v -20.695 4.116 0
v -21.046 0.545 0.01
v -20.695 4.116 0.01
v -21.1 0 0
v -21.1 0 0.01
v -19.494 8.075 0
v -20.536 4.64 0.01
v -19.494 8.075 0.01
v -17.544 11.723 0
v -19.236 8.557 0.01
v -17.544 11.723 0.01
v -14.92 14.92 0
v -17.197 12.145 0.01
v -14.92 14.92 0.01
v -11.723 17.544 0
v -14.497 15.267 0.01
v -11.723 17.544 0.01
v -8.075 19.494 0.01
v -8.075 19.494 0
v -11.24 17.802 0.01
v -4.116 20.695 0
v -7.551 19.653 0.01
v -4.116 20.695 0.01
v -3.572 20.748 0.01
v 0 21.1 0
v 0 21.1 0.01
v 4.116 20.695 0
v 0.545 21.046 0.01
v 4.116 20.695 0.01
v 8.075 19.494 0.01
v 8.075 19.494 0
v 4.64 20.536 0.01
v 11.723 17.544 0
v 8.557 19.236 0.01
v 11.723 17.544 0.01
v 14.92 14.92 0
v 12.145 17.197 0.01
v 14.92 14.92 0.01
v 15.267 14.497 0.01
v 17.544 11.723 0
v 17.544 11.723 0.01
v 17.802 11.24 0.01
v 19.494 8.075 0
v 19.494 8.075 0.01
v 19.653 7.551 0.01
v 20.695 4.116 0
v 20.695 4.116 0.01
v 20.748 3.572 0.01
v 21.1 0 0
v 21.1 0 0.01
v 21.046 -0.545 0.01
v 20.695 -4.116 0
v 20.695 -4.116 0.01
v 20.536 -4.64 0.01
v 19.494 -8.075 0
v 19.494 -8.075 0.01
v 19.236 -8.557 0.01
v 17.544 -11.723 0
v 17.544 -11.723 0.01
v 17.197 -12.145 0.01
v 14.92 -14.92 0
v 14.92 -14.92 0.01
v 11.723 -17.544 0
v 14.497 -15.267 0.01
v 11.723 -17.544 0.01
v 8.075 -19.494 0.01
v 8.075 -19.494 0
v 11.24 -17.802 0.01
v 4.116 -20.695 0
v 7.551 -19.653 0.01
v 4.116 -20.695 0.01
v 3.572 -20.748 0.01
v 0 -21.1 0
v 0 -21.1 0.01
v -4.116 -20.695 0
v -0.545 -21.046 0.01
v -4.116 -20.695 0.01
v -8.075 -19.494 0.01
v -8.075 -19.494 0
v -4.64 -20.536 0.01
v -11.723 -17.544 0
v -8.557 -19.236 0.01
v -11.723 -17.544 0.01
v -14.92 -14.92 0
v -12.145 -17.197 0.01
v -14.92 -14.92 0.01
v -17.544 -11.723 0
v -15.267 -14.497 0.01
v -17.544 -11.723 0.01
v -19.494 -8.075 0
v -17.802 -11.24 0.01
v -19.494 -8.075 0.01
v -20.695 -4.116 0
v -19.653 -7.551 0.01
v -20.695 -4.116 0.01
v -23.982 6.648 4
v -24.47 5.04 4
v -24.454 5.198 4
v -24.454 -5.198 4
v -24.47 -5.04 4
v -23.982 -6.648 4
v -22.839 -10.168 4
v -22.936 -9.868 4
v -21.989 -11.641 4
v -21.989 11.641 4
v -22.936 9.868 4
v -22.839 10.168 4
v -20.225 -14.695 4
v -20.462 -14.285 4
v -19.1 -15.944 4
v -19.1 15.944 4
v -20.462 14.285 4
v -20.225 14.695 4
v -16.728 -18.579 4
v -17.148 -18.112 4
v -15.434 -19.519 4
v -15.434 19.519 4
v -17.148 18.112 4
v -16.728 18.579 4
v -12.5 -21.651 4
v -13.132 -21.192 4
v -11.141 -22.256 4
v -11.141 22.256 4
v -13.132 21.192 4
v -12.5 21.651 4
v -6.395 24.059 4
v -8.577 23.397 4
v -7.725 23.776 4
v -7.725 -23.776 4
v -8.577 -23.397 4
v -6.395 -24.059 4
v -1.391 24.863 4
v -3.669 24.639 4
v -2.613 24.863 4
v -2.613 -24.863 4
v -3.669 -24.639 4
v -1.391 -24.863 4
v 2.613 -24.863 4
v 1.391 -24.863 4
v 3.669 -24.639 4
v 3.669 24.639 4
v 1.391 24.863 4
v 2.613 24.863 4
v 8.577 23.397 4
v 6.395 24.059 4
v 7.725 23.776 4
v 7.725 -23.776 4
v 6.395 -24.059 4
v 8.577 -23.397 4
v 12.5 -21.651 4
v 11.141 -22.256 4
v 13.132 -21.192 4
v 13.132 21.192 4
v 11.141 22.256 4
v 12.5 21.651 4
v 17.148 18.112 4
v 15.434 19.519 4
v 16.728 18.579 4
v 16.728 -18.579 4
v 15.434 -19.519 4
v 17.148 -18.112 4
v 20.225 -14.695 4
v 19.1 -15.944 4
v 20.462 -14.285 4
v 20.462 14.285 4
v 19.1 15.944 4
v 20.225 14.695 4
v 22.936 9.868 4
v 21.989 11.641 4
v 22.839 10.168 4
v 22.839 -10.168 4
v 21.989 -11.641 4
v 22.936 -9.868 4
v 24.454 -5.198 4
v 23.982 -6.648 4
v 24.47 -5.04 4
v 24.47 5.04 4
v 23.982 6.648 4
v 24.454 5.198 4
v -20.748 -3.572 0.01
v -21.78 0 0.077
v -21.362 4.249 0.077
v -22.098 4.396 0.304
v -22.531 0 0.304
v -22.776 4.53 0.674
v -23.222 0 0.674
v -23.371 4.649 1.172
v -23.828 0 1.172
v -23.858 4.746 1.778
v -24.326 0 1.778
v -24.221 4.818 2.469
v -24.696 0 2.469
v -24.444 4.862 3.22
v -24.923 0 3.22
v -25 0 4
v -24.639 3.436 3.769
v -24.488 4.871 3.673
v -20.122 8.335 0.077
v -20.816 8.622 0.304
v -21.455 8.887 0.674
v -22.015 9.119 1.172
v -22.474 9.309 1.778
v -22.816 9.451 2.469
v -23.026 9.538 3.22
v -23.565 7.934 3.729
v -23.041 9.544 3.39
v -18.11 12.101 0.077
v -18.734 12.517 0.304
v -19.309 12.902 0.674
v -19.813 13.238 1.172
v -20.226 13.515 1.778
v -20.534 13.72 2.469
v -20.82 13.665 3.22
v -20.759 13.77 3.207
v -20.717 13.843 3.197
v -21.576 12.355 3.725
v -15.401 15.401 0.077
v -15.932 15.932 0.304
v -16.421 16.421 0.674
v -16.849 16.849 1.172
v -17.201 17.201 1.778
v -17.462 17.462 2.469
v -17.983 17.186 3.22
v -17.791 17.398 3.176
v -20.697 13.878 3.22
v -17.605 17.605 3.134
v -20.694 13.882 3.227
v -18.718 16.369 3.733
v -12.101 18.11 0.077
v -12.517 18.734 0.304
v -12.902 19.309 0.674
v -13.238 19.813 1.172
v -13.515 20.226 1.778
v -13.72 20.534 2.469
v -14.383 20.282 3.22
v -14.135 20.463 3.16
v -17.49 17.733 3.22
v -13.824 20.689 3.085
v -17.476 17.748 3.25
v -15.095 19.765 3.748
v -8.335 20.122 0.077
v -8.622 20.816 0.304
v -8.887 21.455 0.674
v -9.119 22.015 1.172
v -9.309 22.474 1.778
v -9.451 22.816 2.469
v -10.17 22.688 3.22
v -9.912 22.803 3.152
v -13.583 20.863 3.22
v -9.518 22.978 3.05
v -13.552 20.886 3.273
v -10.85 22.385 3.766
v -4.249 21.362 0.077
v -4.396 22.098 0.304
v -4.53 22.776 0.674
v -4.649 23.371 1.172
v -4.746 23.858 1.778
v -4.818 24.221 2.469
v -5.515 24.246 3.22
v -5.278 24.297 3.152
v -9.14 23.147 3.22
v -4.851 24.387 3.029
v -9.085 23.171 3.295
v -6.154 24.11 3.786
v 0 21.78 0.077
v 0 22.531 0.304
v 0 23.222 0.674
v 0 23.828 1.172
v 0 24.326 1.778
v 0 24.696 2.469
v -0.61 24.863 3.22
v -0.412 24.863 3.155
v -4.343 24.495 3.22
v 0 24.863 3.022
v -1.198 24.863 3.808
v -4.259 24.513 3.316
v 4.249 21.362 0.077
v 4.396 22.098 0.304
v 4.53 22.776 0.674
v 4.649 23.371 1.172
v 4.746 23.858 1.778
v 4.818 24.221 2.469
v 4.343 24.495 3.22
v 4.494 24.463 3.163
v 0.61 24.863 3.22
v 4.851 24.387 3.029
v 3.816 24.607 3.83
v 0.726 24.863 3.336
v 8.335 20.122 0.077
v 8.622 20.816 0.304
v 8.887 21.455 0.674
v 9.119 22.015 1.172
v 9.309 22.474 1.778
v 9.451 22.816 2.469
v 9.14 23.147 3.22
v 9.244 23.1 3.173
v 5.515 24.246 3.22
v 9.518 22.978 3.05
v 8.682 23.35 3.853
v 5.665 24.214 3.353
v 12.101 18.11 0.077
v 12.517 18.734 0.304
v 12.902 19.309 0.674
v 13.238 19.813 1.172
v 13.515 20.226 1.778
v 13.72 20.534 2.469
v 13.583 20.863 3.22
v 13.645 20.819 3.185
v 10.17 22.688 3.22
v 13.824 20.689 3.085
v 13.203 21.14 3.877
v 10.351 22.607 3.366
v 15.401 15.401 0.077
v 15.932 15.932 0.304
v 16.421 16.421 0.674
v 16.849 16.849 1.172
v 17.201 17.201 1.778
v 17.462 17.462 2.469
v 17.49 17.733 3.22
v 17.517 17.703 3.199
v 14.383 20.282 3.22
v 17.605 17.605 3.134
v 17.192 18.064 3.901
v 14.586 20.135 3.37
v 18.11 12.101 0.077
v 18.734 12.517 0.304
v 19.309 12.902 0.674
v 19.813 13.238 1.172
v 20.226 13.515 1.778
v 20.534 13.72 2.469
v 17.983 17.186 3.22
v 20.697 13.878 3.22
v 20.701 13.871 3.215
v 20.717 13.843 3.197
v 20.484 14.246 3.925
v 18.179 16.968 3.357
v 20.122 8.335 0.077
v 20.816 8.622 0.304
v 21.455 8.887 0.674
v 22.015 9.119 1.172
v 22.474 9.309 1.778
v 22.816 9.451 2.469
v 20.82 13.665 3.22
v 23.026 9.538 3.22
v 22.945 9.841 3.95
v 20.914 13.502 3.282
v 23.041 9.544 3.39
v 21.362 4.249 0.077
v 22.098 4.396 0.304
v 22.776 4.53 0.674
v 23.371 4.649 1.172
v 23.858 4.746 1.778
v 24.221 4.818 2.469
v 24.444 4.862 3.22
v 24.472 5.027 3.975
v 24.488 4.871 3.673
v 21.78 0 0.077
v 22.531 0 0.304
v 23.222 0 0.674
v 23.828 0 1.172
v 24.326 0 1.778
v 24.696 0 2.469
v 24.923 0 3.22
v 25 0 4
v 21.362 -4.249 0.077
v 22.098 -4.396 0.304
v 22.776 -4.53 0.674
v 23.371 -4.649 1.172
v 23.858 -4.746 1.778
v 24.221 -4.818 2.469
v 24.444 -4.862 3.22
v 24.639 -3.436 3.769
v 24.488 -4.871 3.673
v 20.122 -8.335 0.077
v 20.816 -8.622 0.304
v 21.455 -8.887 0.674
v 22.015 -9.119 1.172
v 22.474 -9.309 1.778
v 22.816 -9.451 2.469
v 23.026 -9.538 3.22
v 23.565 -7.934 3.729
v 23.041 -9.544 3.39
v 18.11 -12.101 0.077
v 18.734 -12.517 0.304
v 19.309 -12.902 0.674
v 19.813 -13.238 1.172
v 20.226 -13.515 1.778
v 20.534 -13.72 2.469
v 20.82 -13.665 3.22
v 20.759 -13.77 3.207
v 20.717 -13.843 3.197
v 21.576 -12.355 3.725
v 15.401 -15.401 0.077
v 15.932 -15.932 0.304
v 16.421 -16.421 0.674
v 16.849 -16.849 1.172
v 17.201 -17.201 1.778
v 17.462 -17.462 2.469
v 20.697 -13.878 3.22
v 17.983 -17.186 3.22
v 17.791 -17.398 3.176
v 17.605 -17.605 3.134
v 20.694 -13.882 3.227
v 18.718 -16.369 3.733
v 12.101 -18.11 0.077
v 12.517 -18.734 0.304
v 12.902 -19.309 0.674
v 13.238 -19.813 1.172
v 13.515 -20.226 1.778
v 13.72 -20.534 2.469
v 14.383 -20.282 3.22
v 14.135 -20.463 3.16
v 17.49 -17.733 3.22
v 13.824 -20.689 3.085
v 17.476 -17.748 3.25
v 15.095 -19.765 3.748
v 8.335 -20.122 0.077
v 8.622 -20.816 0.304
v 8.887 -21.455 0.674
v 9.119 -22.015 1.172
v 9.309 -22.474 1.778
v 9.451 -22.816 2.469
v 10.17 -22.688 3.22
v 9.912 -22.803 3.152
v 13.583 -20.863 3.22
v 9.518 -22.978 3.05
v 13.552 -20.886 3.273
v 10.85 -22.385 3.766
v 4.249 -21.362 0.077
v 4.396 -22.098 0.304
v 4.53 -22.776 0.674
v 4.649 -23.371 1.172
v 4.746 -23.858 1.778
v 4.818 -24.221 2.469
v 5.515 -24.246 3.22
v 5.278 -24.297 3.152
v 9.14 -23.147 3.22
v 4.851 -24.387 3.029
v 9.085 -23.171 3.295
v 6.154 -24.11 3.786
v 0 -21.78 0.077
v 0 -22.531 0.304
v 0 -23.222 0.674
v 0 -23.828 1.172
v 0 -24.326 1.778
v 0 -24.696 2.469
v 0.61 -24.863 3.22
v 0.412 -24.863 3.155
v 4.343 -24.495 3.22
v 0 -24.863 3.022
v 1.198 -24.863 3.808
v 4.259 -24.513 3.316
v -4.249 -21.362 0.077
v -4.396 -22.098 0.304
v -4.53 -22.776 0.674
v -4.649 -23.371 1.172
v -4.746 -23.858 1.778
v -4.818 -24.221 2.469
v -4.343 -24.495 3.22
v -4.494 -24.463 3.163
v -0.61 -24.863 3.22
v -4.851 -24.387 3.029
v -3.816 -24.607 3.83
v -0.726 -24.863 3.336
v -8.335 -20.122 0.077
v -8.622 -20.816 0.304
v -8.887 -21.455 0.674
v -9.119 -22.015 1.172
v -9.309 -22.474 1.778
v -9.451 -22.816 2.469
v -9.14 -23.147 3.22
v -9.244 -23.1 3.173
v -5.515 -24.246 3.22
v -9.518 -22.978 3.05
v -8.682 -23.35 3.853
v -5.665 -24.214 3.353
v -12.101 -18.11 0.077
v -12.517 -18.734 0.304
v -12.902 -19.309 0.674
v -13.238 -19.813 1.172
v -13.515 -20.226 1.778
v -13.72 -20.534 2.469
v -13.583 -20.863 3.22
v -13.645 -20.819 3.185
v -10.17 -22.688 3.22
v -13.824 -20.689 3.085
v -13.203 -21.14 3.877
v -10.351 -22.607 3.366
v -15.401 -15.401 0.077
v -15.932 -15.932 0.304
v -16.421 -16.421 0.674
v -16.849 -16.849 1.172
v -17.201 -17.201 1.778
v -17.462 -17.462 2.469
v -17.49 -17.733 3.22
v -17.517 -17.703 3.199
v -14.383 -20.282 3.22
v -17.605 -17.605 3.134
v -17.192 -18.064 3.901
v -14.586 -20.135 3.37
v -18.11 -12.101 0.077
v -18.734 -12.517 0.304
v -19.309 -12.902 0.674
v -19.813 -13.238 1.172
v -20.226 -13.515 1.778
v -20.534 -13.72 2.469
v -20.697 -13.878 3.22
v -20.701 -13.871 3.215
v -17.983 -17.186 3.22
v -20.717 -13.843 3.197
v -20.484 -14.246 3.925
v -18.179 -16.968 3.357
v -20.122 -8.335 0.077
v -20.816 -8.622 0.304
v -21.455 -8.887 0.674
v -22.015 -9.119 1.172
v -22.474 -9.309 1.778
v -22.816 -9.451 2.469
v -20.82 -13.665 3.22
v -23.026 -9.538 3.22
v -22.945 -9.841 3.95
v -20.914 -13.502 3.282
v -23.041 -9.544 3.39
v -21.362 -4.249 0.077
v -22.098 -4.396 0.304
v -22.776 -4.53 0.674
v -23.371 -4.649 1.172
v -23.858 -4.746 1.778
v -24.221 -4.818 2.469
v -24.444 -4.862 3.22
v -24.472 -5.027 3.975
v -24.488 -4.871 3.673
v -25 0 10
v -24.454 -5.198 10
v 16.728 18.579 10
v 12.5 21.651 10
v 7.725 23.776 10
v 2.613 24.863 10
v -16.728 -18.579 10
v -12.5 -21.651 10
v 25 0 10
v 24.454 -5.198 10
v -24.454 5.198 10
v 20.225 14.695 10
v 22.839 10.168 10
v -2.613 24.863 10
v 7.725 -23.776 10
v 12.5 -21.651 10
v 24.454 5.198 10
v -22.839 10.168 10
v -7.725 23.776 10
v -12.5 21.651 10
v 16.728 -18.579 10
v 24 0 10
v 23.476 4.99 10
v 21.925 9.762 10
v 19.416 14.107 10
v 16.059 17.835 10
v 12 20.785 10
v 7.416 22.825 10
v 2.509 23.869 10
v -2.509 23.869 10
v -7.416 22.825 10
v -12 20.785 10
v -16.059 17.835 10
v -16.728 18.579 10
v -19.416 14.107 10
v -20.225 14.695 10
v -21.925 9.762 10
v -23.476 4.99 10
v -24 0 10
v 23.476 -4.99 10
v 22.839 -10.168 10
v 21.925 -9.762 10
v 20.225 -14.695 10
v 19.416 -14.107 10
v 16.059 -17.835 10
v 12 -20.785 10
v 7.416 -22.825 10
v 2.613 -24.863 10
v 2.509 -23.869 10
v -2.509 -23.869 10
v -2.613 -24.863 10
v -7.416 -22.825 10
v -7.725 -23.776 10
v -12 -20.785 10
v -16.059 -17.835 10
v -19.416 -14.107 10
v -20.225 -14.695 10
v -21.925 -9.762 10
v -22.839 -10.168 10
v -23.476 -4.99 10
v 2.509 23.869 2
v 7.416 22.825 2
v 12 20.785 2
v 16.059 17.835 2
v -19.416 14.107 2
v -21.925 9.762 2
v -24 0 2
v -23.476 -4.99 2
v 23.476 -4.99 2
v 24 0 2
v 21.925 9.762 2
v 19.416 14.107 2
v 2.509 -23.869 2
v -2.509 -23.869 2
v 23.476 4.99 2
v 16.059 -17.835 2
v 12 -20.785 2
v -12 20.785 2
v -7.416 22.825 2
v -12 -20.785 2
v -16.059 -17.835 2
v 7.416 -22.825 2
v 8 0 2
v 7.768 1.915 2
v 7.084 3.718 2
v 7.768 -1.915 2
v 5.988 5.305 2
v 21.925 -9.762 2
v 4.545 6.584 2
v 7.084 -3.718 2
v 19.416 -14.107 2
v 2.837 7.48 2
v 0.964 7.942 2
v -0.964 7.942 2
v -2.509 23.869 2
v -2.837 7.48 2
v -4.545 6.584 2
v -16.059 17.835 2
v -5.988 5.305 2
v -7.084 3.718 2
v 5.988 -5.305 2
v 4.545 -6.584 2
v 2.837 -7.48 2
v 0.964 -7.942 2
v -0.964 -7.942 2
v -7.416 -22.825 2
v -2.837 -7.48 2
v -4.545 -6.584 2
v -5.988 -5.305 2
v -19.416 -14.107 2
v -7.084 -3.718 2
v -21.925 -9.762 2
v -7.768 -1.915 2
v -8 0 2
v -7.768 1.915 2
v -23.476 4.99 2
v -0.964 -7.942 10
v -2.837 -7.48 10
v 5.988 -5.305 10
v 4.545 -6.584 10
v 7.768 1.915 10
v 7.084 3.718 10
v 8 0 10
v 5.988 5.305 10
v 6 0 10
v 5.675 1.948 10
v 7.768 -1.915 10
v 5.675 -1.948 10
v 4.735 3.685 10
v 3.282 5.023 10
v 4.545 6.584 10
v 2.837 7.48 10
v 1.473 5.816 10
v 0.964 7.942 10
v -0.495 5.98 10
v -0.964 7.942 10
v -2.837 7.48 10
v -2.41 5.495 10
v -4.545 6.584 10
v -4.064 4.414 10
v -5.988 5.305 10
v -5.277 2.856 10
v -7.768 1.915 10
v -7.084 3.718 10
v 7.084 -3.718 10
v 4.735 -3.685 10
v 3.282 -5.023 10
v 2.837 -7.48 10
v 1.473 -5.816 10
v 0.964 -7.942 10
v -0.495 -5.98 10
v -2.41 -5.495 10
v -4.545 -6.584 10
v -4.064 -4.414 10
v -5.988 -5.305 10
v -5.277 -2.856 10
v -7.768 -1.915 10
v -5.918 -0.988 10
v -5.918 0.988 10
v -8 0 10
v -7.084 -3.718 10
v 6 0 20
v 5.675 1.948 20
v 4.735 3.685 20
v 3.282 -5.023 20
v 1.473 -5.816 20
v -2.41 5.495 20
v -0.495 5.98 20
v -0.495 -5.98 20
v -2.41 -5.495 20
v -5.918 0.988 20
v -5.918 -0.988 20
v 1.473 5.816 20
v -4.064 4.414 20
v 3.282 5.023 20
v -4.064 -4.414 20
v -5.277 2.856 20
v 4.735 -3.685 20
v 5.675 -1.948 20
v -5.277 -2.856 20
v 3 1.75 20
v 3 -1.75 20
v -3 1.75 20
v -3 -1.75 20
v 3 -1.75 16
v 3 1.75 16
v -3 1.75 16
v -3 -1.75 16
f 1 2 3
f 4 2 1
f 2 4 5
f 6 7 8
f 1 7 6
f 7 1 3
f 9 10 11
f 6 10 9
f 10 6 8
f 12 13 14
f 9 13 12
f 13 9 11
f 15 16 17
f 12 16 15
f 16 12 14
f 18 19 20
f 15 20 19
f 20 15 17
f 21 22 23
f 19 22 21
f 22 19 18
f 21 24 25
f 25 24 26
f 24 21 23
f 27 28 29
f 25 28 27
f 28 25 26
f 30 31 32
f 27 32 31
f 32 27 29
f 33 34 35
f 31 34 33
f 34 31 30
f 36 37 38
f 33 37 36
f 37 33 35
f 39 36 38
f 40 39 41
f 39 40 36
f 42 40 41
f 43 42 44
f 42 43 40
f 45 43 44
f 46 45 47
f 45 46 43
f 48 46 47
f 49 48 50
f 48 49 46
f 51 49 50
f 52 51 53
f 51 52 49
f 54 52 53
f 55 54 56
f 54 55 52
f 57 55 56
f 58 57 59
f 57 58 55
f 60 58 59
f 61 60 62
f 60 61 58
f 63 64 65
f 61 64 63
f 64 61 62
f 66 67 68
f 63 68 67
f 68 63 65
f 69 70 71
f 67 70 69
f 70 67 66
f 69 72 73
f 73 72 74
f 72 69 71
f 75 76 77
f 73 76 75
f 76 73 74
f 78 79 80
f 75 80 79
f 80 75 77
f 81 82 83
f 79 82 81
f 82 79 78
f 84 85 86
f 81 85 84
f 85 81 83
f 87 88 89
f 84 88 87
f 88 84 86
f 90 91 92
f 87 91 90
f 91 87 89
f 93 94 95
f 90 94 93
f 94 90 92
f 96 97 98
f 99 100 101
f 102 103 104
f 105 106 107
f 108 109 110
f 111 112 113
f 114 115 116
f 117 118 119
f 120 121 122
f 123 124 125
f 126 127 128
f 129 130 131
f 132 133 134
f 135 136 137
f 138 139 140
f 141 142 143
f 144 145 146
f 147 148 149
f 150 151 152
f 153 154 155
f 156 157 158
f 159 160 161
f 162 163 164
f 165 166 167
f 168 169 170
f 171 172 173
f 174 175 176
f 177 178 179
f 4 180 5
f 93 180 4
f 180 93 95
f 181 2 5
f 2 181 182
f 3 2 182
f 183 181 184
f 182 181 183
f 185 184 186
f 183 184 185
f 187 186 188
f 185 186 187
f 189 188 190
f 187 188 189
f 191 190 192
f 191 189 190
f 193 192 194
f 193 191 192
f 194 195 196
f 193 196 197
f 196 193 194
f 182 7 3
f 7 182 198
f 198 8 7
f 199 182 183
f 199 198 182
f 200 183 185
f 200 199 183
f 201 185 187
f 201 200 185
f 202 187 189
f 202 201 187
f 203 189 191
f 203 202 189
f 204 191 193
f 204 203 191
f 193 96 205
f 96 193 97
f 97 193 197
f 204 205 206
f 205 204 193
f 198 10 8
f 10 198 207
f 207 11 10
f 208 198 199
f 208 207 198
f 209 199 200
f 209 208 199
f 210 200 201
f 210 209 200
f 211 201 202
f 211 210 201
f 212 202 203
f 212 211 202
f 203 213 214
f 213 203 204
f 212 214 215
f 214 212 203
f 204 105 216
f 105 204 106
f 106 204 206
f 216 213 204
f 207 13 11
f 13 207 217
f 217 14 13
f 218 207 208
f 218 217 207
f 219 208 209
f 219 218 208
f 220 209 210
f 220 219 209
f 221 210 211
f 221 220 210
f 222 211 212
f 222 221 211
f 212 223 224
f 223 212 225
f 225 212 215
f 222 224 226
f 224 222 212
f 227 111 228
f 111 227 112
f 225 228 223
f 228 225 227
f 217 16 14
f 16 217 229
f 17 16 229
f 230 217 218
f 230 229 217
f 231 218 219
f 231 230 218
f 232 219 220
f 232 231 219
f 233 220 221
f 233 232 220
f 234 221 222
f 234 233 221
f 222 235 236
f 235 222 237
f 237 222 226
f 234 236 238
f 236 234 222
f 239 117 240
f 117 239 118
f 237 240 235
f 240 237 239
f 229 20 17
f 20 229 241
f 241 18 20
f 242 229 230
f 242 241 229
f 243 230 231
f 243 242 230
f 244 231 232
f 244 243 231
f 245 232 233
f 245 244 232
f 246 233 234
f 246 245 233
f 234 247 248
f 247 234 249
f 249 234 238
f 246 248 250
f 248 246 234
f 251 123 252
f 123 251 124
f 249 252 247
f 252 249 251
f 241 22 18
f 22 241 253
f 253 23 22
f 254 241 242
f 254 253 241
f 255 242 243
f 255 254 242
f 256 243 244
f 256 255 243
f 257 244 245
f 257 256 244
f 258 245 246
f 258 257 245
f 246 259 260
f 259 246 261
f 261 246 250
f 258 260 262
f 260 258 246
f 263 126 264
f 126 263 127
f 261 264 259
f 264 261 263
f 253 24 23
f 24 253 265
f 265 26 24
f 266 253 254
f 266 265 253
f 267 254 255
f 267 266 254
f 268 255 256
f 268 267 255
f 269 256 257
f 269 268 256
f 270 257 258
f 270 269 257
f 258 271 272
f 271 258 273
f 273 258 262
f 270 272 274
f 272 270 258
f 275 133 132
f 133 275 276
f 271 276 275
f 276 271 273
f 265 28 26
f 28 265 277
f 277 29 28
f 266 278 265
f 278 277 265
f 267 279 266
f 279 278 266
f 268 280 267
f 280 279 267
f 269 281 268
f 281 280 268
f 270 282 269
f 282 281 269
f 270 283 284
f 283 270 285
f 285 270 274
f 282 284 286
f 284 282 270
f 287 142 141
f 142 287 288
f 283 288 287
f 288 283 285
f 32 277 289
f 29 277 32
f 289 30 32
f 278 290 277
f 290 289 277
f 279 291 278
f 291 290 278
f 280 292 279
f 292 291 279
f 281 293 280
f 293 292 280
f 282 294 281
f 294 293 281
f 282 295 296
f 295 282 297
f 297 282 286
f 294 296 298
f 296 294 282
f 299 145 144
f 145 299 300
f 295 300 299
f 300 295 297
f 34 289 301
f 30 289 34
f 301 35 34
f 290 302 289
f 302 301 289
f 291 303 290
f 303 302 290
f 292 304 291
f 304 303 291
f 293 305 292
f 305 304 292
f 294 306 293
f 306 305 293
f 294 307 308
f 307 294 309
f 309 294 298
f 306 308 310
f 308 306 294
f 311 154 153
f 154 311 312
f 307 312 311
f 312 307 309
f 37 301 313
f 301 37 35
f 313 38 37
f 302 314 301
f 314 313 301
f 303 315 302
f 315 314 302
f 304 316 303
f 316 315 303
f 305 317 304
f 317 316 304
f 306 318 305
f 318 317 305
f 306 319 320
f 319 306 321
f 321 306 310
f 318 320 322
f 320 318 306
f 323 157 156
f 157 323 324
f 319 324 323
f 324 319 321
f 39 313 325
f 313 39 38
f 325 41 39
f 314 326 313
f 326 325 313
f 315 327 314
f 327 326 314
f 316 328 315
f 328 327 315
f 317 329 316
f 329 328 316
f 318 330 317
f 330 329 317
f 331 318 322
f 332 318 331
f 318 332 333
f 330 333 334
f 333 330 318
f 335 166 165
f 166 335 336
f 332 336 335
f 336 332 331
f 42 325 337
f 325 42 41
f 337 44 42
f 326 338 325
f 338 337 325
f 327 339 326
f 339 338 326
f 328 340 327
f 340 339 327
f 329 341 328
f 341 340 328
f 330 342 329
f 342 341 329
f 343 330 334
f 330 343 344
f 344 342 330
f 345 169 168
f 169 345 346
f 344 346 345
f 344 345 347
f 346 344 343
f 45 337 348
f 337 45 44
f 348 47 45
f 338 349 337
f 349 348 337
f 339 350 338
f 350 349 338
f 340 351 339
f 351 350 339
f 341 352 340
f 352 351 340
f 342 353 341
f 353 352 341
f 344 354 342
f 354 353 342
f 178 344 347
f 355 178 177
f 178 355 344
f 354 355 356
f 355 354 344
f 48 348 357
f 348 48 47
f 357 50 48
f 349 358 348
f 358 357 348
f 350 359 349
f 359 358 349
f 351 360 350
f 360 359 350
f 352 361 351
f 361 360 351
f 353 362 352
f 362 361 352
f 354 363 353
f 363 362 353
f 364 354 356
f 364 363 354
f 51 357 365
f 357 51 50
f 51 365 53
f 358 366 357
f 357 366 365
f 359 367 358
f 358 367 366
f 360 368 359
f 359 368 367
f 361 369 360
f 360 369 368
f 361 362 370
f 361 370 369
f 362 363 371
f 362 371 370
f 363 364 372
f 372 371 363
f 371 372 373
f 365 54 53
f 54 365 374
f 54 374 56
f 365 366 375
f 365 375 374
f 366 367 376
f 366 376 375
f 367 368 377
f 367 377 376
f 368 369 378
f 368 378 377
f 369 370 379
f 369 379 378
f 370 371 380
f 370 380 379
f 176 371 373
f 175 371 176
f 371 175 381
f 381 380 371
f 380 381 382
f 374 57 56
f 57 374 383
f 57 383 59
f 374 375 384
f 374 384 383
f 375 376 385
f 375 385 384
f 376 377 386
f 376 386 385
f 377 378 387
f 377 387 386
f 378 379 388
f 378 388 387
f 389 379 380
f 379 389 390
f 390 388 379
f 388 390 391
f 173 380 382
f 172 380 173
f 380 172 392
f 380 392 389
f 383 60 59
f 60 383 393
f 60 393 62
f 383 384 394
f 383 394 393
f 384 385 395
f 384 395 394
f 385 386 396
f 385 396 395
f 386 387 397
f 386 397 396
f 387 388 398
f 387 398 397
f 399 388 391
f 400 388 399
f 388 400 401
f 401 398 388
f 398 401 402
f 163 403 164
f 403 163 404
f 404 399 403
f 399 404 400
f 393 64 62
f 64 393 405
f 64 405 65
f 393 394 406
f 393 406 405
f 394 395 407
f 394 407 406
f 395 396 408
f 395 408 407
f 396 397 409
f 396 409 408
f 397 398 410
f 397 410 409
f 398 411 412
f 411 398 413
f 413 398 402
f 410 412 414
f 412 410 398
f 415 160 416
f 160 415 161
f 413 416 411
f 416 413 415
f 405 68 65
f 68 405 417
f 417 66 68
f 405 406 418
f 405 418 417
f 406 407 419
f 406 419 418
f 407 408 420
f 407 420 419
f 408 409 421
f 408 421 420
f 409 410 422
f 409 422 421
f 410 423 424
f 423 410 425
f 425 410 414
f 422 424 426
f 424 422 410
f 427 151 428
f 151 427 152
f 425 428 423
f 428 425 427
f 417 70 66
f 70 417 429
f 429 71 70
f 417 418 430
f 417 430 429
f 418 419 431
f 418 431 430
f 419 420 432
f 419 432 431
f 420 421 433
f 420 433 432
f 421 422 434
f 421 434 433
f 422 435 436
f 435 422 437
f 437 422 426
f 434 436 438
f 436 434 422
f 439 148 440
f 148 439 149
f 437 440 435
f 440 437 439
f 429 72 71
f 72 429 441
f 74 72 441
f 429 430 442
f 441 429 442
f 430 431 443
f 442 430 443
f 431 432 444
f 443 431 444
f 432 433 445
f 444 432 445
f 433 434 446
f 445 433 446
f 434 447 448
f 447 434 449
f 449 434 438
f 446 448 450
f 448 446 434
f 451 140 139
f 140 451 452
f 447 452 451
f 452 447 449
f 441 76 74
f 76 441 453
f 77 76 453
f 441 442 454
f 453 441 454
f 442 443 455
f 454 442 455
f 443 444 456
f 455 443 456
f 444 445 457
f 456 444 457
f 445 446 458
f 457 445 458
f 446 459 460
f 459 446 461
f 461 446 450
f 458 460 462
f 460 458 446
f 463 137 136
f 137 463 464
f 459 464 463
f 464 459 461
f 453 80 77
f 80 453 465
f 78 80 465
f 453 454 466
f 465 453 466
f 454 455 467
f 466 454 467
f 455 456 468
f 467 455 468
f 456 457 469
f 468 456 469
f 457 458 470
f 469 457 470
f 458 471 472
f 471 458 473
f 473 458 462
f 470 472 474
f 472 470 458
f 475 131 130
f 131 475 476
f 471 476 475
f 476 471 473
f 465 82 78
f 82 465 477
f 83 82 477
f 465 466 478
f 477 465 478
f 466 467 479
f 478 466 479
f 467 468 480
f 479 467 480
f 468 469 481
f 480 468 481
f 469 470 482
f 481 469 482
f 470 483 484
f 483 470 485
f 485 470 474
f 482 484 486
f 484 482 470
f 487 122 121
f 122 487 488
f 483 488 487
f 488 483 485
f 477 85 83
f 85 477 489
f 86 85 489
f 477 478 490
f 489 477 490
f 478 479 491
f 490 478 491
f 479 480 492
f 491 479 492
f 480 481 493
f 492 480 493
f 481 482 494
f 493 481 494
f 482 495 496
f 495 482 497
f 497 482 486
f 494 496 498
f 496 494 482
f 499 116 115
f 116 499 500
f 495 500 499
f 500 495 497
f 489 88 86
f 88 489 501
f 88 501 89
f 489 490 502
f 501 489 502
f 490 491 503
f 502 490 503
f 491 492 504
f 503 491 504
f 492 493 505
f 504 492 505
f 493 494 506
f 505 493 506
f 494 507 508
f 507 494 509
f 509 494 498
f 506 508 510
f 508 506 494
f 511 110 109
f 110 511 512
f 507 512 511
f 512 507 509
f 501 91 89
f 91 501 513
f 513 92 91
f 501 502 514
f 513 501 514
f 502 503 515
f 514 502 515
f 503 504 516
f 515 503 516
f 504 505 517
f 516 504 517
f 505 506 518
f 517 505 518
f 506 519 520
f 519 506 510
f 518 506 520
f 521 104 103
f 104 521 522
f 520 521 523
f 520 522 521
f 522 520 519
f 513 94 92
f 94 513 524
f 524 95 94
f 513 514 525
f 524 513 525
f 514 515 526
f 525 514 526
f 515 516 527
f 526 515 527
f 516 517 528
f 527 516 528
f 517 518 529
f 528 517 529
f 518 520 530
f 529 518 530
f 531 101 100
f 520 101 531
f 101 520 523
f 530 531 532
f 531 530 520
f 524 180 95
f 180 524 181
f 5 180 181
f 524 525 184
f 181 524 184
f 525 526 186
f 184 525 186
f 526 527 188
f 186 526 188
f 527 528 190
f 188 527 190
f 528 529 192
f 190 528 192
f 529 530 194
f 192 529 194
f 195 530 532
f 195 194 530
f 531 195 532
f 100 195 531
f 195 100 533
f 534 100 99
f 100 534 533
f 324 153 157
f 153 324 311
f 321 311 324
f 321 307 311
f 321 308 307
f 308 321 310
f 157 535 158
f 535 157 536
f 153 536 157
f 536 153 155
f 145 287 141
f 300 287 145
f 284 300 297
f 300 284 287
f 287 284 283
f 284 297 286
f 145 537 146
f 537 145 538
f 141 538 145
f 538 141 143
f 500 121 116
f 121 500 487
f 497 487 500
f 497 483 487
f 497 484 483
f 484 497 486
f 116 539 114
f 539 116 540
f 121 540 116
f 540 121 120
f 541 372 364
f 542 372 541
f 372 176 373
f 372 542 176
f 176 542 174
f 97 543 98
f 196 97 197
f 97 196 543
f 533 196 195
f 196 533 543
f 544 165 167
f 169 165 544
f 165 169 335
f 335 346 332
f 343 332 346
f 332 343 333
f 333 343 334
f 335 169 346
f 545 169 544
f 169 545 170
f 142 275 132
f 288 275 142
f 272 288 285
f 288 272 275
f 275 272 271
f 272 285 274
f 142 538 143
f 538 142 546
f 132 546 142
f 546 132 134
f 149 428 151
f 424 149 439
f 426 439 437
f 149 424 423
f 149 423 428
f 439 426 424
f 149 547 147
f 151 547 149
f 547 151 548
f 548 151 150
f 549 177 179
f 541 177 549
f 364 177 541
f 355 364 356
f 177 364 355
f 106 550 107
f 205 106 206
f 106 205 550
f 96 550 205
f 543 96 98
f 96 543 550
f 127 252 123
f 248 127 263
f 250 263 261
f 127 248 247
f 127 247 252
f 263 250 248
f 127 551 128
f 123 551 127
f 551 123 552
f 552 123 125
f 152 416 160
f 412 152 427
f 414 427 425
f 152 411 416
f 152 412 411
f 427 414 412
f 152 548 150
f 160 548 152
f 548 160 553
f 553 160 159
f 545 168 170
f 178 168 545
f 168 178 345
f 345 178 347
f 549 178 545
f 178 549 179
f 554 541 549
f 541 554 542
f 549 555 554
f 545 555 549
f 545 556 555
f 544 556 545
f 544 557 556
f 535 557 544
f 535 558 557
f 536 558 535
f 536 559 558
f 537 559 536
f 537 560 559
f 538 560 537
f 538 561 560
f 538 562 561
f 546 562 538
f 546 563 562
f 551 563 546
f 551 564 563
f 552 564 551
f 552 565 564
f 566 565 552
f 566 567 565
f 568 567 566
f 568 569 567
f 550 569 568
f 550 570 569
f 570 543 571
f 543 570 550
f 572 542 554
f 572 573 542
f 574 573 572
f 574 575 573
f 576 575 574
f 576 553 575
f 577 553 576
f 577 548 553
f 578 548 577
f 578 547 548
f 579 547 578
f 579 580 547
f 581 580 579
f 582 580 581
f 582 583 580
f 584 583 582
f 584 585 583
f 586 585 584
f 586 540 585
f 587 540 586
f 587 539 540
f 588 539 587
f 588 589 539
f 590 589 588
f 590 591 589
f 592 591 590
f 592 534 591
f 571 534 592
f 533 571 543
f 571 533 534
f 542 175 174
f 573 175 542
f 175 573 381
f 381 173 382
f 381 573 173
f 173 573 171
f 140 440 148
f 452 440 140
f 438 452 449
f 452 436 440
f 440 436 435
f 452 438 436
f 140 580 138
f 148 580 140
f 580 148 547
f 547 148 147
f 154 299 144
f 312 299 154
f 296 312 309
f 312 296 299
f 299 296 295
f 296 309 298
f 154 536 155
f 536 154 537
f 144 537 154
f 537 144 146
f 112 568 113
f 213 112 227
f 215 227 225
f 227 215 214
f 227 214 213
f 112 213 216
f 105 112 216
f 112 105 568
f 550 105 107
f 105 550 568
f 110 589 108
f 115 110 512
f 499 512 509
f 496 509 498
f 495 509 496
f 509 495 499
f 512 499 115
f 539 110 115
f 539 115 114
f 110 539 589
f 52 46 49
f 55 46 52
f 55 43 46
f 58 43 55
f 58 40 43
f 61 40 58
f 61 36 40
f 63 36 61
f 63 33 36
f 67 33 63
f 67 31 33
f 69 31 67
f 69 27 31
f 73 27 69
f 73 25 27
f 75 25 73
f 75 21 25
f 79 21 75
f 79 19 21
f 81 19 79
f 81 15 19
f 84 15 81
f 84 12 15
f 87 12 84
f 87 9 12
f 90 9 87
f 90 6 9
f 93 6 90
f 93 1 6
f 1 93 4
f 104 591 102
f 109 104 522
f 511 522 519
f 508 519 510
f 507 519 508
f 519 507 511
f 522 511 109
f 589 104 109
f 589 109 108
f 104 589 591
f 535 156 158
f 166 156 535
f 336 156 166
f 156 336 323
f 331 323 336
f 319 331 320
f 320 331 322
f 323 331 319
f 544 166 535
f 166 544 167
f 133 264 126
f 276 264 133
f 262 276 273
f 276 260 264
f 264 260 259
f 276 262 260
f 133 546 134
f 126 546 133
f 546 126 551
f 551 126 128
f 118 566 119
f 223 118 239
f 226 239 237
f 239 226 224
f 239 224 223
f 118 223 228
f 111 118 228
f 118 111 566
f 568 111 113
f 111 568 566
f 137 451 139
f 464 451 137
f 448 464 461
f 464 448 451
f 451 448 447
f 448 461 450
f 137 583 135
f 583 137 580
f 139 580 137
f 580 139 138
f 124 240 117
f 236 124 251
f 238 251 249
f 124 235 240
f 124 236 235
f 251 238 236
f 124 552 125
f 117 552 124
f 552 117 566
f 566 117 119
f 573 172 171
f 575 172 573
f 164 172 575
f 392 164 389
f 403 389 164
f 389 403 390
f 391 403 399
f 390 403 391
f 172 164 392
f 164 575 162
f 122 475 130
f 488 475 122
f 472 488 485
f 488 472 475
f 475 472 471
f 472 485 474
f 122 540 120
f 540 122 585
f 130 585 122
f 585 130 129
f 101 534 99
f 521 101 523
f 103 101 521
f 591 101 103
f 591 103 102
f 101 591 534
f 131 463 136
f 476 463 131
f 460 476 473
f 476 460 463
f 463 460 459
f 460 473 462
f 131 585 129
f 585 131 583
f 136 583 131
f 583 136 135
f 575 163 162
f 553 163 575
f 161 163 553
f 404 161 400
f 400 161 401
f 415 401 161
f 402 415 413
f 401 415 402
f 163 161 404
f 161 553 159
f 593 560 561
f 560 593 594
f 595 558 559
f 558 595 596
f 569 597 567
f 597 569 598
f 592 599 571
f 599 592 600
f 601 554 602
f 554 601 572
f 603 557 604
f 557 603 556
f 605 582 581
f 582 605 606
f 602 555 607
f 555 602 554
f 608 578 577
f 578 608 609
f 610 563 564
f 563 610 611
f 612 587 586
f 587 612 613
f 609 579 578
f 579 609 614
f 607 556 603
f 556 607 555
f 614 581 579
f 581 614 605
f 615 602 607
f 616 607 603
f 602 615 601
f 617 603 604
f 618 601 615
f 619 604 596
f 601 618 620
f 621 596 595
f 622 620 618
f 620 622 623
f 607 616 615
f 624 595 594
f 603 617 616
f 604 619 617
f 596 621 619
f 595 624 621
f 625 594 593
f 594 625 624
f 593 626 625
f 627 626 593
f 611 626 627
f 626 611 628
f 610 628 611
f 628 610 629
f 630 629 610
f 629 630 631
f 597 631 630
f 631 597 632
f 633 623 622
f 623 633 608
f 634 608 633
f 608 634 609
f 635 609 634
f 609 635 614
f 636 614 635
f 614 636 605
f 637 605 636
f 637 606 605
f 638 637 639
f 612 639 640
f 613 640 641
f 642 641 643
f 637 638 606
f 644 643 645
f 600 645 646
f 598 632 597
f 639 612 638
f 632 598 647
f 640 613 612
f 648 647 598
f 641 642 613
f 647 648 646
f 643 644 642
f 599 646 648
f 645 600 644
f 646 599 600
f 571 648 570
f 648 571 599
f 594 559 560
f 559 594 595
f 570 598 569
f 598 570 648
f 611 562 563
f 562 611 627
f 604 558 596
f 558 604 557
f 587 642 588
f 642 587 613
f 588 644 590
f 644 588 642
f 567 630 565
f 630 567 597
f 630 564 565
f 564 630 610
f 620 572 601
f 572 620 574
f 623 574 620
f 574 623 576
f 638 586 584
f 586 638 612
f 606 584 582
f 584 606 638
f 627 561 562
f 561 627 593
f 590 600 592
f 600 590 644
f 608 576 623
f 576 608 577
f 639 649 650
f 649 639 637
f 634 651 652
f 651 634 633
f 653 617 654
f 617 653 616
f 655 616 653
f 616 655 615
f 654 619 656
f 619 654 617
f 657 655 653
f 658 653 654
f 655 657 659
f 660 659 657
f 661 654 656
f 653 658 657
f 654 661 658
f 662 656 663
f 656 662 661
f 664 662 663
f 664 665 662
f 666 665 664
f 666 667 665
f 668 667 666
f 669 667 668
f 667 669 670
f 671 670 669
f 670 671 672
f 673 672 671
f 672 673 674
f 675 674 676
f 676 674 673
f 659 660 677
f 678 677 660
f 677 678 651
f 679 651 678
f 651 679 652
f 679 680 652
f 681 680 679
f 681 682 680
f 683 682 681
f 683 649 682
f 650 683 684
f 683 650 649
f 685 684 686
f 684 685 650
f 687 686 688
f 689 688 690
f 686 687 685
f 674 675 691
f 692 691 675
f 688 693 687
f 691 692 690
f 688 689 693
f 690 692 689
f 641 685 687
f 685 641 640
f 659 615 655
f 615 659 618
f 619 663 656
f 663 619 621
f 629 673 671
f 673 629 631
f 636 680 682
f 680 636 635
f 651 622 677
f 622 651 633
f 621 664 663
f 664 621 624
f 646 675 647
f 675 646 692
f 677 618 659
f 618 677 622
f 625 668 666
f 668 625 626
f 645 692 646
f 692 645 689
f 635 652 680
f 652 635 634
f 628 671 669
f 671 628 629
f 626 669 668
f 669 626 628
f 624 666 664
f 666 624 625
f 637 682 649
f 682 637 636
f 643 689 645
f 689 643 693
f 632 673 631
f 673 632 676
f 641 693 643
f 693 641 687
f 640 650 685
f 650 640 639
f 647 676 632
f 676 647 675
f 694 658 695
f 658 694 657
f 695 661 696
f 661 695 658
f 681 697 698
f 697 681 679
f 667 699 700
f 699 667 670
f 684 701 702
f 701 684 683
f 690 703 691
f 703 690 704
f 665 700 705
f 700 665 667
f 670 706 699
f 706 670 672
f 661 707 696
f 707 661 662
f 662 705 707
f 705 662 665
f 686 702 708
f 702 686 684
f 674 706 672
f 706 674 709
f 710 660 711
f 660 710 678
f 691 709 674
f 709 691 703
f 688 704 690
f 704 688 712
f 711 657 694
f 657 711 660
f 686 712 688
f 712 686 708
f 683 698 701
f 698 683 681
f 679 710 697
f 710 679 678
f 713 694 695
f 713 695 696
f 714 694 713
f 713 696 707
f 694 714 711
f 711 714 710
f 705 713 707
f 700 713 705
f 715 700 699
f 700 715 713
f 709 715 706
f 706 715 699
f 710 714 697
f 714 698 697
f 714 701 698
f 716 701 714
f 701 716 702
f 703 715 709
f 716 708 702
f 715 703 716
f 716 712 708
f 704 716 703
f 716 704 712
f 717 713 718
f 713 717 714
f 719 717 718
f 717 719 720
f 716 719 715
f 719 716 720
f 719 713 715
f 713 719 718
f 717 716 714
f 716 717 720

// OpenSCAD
// These settings worked with my printer for a Koni Yellow adjustable shock.
// Your results may vary - adjust if necessary (scaling the model could work too).

/* [Tool Head] */

// The X in mm of the shock adjustor head
shock_adjuster_x = 6; 
// Y in mm of the shock adjustor head
shock_adjuster_y = 3.5;
// depth for the tool head.
shock_adjuster_height = 4;

// You probably don't need to change these but they're around for you anyway.

/* [Advanced Dimensions] */

// The radius of the outer "gripper" component
grip_radius = 25;
// The thickness of the "gripper" piece.
gripper_thickness = 2; // Less than 2mm seems pretty weak in ABS.
// The height of the gripper piece.
gripper_height = 10; // Less than 1cm is hard to grip
// The center cylinder which supports the narrow tool head
center_reinforcement_radius = 8;
// The length which the tool head extends beyond the gripper
tool_head_height = 10;
// The radius of the actual tool head
tool_head_radius = 6; 

/* [Rounded Corners] */

// Prevents "dangling" edges from the cylinder by making the rounded edge a bit bigger.
pad = .1; // Too low and you'll get non-manifold parts. Too high and you'll get gaps.

// Radius of the rounded edge.
round_radius = 4;
// How smooth to make the rounded edge
round_smooth = 32;	// Higher = smoother but big STL.

//Gripper
difference(){
	union(){
		// Hand-holder cylinder
		cylinder(r=grip_radius,h=gripper_height);
	}
	translate([0,0,0]){
		translate([0,0,gripper_thickness])
			cylinder(r=grip_radius - gripper_thickness / 2, h=gripper_height);
	}
// Bottom Round
	difference() {
		rotate_extrude(convexity=10,  $fn = round_smooth)
			translate([grip_radius-round_radius+pad,-pad,0])
				square(round_radius+pad,round_radius+pad);
		rotate_extrude(convexity=10,  $fn = round_smooth)
			translate([grip_radius-round_radius,round_radius,0])
				circle(r=round_radius,$fn=round_smooth);
	}
}
// Adjustment head
difference(){
	union(){
		// center cylinder taper (support)
		cylinder(r=center_reinforcement_radius, h=10);
    //center cylinder
		cylinder(r=tool_head_radius, h=gripper_height+tool_head_height);
	}
	// Cut-out for shock adjustor
	translate([0,0,gripper_height+tool_head_height])
		cube(size=[shock_adjuster_x,shock_adjuster_y,shock_adjuster_height*2], center=true);
}
